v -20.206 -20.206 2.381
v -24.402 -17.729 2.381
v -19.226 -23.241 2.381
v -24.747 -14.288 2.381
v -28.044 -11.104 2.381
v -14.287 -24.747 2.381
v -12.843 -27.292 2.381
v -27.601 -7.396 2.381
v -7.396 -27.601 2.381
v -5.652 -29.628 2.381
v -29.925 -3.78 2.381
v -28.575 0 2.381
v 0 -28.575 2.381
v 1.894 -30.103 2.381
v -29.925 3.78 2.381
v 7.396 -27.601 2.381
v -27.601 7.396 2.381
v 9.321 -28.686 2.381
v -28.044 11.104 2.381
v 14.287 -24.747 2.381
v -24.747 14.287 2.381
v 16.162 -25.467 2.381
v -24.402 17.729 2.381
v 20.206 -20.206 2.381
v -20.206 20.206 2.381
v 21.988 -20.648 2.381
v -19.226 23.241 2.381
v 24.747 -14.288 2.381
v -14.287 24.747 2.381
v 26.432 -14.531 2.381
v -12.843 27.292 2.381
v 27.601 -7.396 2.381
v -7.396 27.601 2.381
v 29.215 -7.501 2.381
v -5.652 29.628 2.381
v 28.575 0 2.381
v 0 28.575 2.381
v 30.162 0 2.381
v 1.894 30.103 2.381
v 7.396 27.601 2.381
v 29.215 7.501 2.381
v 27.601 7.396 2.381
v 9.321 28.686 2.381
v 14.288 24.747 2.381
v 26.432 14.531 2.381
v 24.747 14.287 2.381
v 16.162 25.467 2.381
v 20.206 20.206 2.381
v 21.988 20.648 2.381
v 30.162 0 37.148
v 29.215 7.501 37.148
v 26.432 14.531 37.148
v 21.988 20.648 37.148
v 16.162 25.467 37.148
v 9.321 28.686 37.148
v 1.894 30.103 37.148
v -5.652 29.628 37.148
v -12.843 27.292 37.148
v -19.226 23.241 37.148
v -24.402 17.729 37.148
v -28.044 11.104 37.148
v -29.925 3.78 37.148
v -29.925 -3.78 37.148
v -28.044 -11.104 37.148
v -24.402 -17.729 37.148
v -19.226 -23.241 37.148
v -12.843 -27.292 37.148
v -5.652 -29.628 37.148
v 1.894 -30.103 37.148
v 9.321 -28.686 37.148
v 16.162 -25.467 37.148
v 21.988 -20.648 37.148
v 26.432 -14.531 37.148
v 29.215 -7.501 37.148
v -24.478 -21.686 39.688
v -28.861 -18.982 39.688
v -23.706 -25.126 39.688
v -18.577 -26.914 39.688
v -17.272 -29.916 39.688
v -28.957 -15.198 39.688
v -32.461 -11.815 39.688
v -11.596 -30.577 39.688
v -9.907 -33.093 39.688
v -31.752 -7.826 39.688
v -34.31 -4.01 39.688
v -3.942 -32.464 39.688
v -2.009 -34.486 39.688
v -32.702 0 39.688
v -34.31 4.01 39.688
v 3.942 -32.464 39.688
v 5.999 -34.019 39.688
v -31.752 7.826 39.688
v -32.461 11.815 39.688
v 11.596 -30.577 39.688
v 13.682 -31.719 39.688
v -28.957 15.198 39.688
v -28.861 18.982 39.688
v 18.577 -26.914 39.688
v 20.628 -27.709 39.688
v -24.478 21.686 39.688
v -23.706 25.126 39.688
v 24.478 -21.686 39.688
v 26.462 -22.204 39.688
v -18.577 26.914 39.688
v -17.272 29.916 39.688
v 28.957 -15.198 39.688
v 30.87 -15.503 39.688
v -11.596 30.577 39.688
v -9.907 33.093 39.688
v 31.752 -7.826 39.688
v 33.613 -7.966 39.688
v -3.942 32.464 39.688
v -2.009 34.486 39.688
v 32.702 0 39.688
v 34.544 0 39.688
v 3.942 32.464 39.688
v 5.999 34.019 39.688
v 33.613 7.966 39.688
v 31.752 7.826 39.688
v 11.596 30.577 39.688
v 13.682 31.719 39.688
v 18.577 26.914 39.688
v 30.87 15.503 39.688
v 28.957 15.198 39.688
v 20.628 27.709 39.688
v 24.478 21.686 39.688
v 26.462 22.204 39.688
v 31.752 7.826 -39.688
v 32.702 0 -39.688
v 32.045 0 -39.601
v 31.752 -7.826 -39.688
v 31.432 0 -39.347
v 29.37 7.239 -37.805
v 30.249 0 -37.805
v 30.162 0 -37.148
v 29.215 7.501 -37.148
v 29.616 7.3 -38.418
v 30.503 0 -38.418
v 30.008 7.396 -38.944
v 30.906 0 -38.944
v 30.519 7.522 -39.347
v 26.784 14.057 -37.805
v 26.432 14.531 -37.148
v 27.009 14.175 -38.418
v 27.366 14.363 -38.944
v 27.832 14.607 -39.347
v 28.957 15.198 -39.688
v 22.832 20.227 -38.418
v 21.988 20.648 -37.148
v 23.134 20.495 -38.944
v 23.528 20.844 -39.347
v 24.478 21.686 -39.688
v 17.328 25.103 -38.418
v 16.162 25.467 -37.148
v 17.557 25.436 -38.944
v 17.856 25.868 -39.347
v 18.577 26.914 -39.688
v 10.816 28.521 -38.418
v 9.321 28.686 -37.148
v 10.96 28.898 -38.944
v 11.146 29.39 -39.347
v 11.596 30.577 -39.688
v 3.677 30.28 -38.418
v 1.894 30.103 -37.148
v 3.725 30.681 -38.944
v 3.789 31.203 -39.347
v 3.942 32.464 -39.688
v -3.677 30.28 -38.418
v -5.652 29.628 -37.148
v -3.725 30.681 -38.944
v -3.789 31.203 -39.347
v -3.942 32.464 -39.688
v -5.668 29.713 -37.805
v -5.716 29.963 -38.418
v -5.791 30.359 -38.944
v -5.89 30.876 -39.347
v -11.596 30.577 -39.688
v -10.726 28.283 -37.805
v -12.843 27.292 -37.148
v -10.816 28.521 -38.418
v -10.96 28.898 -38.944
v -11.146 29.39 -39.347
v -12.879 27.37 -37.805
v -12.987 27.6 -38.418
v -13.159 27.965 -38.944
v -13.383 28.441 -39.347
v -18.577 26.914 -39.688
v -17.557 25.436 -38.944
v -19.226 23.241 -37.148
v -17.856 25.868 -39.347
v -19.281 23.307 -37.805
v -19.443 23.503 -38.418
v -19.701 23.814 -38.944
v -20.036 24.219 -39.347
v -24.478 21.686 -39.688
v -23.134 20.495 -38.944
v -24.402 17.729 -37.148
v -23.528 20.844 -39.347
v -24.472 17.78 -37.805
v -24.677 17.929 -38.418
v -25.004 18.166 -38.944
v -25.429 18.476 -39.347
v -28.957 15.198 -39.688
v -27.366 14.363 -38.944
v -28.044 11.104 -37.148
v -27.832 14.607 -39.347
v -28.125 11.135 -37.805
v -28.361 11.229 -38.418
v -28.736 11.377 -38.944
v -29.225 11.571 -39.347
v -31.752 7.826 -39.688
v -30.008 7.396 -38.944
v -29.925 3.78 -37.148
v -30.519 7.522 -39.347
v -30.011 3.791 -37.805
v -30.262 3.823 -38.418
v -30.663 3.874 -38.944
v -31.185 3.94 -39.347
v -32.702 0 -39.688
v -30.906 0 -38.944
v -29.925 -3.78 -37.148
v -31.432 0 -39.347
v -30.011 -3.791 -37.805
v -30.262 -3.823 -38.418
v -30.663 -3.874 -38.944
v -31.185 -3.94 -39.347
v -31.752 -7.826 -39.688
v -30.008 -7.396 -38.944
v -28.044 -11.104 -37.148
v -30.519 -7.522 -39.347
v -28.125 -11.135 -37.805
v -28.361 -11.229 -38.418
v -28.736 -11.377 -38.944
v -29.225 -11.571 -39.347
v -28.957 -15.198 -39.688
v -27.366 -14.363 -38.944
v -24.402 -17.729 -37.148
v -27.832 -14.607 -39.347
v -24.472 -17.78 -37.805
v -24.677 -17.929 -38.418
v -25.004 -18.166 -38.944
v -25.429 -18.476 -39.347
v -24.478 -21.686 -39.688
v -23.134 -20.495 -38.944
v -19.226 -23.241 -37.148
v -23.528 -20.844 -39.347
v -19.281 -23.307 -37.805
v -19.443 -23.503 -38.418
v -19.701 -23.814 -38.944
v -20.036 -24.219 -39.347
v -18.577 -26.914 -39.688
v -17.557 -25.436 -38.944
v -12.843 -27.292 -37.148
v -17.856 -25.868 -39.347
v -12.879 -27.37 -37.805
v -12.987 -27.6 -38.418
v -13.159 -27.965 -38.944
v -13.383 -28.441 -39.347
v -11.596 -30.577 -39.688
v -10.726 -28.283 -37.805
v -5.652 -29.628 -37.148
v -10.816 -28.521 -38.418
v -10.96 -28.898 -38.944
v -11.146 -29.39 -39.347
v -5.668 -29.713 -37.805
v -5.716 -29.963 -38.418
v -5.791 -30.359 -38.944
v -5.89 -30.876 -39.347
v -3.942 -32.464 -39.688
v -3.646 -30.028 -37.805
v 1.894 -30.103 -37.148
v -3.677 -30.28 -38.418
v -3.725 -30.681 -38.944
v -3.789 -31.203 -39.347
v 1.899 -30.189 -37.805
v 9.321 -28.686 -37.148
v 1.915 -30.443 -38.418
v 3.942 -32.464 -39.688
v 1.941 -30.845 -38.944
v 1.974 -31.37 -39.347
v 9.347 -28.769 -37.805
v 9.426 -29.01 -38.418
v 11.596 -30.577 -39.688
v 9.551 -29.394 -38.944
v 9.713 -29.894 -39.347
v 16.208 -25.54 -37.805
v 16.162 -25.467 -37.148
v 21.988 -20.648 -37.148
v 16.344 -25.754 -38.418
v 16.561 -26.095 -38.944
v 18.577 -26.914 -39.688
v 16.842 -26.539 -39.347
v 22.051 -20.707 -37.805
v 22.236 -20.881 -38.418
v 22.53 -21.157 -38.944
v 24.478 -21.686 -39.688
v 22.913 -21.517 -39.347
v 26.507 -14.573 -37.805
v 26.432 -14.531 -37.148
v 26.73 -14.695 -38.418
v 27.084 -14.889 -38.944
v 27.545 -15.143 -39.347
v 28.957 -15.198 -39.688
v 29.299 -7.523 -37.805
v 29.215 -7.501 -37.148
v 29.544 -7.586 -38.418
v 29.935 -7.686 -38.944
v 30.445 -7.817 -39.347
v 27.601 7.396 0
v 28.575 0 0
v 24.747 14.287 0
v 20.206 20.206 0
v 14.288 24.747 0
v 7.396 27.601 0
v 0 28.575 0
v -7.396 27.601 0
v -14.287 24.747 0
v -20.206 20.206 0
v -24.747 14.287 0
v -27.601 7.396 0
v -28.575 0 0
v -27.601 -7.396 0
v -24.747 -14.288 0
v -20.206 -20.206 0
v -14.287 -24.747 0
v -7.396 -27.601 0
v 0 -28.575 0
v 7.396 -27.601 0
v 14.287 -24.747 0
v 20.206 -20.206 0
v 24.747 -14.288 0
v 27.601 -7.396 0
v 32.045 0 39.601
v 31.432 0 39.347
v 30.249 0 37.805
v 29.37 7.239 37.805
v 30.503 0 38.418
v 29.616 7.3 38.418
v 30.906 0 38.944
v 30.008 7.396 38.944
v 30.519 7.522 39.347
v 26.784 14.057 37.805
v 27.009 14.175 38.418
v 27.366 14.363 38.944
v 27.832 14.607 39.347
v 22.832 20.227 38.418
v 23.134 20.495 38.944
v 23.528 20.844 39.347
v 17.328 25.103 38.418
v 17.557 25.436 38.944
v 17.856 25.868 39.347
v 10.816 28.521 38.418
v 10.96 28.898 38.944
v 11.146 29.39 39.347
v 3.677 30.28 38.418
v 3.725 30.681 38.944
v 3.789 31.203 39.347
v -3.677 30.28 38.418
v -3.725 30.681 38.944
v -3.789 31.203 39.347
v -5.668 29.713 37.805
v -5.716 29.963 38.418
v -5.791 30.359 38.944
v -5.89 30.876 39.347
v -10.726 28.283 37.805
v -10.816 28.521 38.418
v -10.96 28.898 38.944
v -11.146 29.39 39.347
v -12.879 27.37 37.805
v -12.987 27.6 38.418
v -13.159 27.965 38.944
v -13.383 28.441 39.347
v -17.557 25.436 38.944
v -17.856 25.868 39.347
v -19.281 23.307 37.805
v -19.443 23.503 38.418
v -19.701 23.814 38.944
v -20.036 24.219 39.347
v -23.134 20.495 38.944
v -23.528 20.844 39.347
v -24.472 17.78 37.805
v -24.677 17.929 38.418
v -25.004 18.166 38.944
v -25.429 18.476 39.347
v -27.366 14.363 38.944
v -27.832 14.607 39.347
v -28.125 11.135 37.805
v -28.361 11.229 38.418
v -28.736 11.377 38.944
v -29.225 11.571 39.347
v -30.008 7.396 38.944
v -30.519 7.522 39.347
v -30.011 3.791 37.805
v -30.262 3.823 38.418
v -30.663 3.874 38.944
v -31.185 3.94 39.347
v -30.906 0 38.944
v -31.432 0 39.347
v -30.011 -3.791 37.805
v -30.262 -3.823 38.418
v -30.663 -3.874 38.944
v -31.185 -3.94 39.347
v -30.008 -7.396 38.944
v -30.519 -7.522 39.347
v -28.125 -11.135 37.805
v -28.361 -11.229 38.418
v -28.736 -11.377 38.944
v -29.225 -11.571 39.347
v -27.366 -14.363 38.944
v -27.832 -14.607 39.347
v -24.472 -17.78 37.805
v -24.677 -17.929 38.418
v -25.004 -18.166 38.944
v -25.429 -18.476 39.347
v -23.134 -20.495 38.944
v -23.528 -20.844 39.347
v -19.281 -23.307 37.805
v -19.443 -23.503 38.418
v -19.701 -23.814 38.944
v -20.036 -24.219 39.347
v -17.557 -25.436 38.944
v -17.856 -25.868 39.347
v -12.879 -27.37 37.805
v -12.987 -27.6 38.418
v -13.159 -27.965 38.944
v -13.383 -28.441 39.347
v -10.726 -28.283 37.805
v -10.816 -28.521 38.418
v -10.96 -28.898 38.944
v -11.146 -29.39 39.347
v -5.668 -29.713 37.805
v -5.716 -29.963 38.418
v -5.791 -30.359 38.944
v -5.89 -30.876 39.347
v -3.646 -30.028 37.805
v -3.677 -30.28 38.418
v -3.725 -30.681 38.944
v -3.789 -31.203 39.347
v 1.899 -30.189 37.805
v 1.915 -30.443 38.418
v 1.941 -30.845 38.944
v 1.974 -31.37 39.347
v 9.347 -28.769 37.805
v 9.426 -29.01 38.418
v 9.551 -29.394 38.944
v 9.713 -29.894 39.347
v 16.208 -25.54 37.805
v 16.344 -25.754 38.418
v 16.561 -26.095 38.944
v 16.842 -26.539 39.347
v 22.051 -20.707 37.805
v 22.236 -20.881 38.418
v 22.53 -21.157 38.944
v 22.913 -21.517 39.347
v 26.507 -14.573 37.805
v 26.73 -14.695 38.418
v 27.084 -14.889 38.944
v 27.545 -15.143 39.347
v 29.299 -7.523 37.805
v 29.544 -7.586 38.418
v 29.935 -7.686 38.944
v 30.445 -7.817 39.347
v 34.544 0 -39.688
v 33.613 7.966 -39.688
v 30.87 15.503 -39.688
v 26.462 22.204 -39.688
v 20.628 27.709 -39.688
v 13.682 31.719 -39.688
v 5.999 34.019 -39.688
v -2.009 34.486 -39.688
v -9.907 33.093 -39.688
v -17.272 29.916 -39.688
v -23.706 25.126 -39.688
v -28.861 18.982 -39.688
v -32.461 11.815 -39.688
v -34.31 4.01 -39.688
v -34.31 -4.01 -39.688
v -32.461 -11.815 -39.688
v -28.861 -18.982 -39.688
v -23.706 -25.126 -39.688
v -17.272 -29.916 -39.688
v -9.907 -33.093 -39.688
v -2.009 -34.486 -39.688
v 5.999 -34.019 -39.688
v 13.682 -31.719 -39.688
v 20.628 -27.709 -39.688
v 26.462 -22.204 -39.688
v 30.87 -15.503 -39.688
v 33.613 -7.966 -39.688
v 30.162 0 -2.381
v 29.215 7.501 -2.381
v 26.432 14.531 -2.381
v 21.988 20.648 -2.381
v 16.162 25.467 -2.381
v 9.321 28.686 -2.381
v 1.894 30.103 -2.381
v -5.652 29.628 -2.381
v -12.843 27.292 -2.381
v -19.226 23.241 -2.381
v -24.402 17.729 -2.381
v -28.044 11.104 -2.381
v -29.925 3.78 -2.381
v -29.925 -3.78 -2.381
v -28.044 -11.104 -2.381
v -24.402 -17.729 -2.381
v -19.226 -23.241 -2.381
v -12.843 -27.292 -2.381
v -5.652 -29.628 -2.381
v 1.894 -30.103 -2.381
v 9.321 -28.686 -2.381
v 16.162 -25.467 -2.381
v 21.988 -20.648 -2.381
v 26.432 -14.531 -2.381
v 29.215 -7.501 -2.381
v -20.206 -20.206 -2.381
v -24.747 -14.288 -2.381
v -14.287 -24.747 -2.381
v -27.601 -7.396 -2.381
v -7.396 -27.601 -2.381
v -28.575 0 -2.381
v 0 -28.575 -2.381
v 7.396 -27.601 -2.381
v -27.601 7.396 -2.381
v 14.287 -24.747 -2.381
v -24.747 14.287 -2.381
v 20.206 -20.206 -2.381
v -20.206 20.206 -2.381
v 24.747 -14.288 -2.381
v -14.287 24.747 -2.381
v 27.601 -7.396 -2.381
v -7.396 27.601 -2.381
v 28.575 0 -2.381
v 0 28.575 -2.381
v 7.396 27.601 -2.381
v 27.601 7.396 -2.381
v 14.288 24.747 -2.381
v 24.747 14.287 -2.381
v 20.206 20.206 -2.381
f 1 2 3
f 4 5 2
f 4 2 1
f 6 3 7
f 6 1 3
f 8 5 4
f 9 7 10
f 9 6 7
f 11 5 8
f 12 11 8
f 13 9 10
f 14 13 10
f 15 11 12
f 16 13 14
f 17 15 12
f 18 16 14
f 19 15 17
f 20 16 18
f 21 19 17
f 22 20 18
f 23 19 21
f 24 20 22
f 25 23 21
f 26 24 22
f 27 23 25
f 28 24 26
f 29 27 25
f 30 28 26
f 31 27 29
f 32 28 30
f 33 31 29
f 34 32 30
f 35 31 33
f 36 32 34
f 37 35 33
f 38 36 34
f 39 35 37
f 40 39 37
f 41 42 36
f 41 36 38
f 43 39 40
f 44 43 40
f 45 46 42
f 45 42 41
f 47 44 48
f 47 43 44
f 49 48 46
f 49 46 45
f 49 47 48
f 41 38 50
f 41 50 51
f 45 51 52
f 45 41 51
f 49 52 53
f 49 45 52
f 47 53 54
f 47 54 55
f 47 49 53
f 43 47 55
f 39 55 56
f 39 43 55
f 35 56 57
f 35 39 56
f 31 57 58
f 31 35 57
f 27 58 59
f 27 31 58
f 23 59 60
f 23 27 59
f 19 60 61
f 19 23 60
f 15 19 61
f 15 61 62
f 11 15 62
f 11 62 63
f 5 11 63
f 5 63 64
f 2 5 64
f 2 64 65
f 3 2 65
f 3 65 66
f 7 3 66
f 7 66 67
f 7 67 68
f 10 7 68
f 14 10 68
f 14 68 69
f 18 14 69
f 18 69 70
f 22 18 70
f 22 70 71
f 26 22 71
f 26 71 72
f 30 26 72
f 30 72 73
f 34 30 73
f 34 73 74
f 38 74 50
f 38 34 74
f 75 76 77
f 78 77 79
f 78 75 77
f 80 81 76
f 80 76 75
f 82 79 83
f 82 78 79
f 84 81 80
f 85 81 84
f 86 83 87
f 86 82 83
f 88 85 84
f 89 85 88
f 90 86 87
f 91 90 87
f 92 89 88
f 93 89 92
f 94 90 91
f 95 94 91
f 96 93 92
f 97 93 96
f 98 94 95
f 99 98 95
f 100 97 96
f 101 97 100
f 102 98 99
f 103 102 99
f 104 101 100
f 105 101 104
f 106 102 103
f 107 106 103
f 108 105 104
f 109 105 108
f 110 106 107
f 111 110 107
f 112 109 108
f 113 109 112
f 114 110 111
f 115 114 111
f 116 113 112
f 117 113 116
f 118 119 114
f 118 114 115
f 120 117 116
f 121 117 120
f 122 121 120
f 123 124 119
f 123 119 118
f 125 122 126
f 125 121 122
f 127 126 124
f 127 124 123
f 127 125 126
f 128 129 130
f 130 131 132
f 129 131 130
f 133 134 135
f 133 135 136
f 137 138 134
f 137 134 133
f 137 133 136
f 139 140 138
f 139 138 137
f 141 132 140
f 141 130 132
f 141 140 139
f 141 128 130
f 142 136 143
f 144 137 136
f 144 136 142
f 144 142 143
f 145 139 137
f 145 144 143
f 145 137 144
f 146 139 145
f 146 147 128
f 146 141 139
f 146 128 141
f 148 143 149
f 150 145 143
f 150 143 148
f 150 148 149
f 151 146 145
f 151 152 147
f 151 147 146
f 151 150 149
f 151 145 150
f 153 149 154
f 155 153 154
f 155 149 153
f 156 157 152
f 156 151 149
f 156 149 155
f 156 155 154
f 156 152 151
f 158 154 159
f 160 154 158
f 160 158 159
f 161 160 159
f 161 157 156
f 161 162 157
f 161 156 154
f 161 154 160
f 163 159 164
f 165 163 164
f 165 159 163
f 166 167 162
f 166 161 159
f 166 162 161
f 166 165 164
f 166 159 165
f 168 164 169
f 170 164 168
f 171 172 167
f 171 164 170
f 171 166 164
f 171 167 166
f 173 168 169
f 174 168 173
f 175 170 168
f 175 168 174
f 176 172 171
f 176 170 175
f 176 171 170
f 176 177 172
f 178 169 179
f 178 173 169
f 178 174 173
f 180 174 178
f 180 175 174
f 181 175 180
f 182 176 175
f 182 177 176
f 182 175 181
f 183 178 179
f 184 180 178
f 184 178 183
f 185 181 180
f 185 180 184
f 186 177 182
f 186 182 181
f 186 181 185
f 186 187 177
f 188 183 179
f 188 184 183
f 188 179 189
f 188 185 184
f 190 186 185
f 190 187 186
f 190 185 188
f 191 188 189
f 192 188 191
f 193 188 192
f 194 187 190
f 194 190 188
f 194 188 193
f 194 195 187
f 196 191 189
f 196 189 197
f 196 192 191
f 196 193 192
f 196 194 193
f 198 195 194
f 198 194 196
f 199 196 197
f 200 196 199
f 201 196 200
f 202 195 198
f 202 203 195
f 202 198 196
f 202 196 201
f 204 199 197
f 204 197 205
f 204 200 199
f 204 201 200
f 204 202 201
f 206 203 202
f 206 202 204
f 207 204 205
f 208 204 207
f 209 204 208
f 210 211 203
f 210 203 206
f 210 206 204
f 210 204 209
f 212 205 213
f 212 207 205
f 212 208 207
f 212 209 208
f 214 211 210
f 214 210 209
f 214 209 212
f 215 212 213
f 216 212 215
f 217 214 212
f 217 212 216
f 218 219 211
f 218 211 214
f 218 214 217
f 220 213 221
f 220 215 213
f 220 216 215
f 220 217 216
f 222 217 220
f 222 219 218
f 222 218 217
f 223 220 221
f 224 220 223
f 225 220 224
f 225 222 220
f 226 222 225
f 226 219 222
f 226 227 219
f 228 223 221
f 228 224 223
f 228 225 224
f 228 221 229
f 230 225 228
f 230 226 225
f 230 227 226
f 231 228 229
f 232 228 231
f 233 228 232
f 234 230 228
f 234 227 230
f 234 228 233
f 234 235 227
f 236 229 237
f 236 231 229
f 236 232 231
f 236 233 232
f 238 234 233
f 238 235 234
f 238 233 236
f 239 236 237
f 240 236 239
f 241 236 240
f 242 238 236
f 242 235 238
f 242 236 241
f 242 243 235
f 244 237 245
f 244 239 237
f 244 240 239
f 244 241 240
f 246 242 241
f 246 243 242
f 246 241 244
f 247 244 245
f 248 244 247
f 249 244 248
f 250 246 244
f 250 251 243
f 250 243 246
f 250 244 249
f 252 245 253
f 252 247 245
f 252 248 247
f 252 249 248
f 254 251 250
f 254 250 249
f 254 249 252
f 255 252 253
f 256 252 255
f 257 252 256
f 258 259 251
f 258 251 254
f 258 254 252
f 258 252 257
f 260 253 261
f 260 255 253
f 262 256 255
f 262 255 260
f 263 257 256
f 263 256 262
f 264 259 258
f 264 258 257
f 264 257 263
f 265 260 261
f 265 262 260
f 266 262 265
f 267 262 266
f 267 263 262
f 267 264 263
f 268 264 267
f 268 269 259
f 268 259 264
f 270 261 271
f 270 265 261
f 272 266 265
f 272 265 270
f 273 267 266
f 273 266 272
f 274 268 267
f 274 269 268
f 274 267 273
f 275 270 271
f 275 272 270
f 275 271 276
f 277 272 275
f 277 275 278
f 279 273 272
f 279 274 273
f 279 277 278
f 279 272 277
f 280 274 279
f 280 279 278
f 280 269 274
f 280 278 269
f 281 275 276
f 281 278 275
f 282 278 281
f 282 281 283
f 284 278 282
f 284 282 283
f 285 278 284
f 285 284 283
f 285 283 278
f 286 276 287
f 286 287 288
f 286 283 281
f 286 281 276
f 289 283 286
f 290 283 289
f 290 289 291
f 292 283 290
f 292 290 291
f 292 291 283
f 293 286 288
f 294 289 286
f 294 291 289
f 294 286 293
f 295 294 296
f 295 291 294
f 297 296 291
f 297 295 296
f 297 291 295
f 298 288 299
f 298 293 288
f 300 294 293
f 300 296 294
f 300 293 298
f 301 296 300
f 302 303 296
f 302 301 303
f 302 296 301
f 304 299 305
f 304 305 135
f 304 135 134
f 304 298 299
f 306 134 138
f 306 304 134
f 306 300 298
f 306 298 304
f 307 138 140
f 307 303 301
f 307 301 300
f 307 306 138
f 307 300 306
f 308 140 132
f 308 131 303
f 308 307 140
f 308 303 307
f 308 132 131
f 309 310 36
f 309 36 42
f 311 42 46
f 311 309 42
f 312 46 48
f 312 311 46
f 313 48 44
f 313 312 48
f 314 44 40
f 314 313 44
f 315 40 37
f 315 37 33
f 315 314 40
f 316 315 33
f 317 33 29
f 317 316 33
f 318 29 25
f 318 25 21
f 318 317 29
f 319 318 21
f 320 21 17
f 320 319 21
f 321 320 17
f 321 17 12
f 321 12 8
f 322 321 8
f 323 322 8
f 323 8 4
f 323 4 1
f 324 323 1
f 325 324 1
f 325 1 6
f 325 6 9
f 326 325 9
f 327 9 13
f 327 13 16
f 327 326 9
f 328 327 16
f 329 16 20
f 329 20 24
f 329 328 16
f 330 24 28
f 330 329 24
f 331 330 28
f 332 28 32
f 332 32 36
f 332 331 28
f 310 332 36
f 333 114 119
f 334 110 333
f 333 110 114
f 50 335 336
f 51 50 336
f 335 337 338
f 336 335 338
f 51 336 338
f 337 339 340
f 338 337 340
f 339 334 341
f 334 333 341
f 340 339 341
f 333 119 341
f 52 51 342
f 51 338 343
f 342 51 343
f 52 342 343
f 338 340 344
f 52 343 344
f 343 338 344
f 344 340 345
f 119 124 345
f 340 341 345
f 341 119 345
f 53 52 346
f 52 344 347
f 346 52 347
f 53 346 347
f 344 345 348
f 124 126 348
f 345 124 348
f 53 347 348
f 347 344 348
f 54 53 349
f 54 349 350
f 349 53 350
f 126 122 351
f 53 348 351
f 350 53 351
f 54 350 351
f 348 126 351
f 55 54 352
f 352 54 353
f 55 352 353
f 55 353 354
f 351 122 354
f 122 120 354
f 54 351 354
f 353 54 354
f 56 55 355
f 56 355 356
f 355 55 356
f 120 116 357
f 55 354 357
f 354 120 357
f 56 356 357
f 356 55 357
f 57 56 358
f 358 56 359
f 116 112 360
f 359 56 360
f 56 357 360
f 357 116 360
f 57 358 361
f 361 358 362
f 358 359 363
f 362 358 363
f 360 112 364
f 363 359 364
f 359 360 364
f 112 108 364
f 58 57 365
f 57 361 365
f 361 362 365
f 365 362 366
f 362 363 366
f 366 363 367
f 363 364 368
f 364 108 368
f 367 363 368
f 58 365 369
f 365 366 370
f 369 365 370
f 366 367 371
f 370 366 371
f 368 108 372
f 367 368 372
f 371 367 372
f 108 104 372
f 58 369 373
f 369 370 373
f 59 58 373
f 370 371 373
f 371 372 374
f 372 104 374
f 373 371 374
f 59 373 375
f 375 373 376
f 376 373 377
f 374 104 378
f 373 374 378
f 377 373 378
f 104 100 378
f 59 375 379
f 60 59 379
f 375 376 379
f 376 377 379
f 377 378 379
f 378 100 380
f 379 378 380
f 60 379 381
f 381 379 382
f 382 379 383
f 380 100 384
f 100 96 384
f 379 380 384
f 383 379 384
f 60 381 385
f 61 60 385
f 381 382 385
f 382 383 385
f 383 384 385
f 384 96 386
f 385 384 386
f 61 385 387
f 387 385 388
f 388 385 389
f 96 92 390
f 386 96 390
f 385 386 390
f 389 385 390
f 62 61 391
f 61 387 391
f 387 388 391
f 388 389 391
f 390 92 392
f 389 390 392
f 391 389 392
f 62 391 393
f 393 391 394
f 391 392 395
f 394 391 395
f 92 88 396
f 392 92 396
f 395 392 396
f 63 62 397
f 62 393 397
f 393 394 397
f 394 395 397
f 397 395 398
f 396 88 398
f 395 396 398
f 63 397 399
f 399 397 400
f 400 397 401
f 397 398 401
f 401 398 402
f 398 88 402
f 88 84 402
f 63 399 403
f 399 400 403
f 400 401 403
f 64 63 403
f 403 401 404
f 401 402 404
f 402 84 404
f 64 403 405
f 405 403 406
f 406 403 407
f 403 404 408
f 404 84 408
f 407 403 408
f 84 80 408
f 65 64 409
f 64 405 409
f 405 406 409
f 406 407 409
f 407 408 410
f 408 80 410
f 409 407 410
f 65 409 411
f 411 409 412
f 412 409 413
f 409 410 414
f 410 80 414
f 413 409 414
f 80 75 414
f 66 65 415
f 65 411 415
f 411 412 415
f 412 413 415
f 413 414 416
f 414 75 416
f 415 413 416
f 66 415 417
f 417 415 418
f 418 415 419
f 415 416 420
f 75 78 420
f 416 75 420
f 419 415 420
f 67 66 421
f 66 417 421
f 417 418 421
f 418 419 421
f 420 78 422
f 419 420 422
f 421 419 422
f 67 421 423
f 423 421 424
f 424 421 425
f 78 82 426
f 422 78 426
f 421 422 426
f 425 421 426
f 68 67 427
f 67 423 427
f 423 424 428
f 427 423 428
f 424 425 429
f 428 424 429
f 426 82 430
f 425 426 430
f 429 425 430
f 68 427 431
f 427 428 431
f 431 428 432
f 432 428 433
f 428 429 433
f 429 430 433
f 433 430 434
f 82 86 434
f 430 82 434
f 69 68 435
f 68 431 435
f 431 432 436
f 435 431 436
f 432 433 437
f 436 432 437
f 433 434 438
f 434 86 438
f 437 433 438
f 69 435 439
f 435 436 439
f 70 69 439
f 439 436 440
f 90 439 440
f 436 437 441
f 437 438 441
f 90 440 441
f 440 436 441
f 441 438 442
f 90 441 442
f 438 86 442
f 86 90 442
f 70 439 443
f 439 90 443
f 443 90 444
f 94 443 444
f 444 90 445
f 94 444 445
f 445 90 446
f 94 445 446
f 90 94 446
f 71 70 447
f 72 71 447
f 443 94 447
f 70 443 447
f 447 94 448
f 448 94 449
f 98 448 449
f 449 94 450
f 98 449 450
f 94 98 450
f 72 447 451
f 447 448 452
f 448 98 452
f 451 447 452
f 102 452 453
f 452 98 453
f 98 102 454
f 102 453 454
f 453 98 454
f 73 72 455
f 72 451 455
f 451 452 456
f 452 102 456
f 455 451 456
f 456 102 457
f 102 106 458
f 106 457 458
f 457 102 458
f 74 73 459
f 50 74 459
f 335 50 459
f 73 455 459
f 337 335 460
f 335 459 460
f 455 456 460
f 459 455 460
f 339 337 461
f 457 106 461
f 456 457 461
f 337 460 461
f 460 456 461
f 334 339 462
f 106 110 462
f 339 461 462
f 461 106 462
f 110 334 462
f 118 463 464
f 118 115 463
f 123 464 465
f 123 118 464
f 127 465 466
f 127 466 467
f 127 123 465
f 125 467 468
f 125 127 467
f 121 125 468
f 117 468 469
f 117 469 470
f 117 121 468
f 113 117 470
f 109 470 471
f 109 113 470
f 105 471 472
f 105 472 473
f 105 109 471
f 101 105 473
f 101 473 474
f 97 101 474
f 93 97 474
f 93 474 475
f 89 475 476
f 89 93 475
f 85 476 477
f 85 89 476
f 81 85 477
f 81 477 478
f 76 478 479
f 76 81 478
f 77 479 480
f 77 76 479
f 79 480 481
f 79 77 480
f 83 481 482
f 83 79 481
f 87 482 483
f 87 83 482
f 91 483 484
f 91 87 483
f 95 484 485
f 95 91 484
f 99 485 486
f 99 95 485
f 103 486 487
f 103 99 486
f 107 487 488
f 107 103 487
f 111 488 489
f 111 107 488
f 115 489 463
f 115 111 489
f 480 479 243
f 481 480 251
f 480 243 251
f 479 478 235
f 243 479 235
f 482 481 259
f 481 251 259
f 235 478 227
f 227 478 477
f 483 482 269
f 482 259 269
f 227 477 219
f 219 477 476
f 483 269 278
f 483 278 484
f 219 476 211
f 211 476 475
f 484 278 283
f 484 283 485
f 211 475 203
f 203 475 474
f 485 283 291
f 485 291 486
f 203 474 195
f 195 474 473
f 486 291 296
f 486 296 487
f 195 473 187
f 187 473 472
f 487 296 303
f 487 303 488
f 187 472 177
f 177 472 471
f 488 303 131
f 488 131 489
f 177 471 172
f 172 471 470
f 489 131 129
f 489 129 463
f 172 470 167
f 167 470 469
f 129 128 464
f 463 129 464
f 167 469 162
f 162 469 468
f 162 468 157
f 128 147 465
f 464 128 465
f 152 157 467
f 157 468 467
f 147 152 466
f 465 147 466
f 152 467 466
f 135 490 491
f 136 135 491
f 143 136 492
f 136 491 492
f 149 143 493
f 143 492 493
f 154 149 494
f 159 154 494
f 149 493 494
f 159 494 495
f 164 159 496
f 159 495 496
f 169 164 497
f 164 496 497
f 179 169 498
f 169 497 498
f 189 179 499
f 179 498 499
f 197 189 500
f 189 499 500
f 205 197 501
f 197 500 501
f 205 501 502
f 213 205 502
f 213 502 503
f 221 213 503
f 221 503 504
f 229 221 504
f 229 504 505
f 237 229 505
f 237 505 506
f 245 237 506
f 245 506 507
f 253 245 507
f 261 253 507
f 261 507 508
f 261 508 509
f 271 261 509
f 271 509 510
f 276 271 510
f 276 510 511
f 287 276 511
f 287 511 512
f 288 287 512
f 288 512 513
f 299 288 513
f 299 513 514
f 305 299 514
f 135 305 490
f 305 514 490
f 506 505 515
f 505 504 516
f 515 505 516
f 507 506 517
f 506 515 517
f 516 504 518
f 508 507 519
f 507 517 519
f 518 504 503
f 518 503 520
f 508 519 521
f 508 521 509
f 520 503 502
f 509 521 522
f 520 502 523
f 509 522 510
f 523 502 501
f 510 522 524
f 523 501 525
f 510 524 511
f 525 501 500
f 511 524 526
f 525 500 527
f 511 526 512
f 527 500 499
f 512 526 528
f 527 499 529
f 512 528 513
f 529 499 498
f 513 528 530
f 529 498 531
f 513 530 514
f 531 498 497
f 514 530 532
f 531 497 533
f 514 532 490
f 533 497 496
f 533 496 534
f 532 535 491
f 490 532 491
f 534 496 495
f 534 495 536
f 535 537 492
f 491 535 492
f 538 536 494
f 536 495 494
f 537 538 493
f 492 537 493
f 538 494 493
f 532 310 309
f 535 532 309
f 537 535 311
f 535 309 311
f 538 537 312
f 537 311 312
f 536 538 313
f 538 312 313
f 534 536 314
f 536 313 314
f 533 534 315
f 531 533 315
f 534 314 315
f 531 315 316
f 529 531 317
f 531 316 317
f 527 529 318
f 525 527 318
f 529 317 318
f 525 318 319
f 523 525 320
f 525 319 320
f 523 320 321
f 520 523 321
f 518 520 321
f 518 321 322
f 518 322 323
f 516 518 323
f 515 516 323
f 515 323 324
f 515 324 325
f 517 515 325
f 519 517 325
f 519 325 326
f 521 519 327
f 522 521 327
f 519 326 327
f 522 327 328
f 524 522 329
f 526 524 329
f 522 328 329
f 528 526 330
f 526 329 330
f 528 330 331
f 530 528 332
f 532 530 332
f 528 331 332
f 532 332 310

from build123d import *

# Parameters (mm, degrees)
F0_R          = 34.544
F0_R_2        = 30.1625
F1_DEPTH      = 39.6875
F1_DEPTH_BACK = 39.6875
F0_R_3        = 28.575
F2_DEPTH      = 2.38125
F2_DEPTH_BACK = 2.38125
F3_R          = 2.54


# Not quite as in the source:
# - a length typed as a fraction of an inch, garbled in the dataset ("3 / 203.2 mm" for 3/8 in), is restored


with BuildPart() as f1:
    # F0 (on Top) → F1 (new body, two sides)
    with BuildSketch(Plane.XY) as f1_sk:
        Circle(F0_R)
        Circle(F0_R_2, mode=Mode.SUBTRACT)
    extrude(amount=F1_DEPTH)
    extrude(f1_sk.sketch, amount=-F1_DEPTH_BACK)

    # F0 (on Top) → F2 (join, two sides)
    with BuildSketch(Plane.XY) as f2_sk:
        Circle(F0_R_2)
        Circle(F0_R_3, mode=Mode.SUBTRACT)
    extrude(amount=F2_DEPTH)
    extrude(f2_sk.sketch, amount=-F2_DEPTH_BACK)

    # F3
    f3_edges = [f1.edges().sort_by_distance(p)[0] for p in [
        (-30.1625, 0, 39.6875),
        (-30.1625, 0, -39.6875),
    ]]
    fillet(f3_edges, radius=F3_R)


solid = f1.part
